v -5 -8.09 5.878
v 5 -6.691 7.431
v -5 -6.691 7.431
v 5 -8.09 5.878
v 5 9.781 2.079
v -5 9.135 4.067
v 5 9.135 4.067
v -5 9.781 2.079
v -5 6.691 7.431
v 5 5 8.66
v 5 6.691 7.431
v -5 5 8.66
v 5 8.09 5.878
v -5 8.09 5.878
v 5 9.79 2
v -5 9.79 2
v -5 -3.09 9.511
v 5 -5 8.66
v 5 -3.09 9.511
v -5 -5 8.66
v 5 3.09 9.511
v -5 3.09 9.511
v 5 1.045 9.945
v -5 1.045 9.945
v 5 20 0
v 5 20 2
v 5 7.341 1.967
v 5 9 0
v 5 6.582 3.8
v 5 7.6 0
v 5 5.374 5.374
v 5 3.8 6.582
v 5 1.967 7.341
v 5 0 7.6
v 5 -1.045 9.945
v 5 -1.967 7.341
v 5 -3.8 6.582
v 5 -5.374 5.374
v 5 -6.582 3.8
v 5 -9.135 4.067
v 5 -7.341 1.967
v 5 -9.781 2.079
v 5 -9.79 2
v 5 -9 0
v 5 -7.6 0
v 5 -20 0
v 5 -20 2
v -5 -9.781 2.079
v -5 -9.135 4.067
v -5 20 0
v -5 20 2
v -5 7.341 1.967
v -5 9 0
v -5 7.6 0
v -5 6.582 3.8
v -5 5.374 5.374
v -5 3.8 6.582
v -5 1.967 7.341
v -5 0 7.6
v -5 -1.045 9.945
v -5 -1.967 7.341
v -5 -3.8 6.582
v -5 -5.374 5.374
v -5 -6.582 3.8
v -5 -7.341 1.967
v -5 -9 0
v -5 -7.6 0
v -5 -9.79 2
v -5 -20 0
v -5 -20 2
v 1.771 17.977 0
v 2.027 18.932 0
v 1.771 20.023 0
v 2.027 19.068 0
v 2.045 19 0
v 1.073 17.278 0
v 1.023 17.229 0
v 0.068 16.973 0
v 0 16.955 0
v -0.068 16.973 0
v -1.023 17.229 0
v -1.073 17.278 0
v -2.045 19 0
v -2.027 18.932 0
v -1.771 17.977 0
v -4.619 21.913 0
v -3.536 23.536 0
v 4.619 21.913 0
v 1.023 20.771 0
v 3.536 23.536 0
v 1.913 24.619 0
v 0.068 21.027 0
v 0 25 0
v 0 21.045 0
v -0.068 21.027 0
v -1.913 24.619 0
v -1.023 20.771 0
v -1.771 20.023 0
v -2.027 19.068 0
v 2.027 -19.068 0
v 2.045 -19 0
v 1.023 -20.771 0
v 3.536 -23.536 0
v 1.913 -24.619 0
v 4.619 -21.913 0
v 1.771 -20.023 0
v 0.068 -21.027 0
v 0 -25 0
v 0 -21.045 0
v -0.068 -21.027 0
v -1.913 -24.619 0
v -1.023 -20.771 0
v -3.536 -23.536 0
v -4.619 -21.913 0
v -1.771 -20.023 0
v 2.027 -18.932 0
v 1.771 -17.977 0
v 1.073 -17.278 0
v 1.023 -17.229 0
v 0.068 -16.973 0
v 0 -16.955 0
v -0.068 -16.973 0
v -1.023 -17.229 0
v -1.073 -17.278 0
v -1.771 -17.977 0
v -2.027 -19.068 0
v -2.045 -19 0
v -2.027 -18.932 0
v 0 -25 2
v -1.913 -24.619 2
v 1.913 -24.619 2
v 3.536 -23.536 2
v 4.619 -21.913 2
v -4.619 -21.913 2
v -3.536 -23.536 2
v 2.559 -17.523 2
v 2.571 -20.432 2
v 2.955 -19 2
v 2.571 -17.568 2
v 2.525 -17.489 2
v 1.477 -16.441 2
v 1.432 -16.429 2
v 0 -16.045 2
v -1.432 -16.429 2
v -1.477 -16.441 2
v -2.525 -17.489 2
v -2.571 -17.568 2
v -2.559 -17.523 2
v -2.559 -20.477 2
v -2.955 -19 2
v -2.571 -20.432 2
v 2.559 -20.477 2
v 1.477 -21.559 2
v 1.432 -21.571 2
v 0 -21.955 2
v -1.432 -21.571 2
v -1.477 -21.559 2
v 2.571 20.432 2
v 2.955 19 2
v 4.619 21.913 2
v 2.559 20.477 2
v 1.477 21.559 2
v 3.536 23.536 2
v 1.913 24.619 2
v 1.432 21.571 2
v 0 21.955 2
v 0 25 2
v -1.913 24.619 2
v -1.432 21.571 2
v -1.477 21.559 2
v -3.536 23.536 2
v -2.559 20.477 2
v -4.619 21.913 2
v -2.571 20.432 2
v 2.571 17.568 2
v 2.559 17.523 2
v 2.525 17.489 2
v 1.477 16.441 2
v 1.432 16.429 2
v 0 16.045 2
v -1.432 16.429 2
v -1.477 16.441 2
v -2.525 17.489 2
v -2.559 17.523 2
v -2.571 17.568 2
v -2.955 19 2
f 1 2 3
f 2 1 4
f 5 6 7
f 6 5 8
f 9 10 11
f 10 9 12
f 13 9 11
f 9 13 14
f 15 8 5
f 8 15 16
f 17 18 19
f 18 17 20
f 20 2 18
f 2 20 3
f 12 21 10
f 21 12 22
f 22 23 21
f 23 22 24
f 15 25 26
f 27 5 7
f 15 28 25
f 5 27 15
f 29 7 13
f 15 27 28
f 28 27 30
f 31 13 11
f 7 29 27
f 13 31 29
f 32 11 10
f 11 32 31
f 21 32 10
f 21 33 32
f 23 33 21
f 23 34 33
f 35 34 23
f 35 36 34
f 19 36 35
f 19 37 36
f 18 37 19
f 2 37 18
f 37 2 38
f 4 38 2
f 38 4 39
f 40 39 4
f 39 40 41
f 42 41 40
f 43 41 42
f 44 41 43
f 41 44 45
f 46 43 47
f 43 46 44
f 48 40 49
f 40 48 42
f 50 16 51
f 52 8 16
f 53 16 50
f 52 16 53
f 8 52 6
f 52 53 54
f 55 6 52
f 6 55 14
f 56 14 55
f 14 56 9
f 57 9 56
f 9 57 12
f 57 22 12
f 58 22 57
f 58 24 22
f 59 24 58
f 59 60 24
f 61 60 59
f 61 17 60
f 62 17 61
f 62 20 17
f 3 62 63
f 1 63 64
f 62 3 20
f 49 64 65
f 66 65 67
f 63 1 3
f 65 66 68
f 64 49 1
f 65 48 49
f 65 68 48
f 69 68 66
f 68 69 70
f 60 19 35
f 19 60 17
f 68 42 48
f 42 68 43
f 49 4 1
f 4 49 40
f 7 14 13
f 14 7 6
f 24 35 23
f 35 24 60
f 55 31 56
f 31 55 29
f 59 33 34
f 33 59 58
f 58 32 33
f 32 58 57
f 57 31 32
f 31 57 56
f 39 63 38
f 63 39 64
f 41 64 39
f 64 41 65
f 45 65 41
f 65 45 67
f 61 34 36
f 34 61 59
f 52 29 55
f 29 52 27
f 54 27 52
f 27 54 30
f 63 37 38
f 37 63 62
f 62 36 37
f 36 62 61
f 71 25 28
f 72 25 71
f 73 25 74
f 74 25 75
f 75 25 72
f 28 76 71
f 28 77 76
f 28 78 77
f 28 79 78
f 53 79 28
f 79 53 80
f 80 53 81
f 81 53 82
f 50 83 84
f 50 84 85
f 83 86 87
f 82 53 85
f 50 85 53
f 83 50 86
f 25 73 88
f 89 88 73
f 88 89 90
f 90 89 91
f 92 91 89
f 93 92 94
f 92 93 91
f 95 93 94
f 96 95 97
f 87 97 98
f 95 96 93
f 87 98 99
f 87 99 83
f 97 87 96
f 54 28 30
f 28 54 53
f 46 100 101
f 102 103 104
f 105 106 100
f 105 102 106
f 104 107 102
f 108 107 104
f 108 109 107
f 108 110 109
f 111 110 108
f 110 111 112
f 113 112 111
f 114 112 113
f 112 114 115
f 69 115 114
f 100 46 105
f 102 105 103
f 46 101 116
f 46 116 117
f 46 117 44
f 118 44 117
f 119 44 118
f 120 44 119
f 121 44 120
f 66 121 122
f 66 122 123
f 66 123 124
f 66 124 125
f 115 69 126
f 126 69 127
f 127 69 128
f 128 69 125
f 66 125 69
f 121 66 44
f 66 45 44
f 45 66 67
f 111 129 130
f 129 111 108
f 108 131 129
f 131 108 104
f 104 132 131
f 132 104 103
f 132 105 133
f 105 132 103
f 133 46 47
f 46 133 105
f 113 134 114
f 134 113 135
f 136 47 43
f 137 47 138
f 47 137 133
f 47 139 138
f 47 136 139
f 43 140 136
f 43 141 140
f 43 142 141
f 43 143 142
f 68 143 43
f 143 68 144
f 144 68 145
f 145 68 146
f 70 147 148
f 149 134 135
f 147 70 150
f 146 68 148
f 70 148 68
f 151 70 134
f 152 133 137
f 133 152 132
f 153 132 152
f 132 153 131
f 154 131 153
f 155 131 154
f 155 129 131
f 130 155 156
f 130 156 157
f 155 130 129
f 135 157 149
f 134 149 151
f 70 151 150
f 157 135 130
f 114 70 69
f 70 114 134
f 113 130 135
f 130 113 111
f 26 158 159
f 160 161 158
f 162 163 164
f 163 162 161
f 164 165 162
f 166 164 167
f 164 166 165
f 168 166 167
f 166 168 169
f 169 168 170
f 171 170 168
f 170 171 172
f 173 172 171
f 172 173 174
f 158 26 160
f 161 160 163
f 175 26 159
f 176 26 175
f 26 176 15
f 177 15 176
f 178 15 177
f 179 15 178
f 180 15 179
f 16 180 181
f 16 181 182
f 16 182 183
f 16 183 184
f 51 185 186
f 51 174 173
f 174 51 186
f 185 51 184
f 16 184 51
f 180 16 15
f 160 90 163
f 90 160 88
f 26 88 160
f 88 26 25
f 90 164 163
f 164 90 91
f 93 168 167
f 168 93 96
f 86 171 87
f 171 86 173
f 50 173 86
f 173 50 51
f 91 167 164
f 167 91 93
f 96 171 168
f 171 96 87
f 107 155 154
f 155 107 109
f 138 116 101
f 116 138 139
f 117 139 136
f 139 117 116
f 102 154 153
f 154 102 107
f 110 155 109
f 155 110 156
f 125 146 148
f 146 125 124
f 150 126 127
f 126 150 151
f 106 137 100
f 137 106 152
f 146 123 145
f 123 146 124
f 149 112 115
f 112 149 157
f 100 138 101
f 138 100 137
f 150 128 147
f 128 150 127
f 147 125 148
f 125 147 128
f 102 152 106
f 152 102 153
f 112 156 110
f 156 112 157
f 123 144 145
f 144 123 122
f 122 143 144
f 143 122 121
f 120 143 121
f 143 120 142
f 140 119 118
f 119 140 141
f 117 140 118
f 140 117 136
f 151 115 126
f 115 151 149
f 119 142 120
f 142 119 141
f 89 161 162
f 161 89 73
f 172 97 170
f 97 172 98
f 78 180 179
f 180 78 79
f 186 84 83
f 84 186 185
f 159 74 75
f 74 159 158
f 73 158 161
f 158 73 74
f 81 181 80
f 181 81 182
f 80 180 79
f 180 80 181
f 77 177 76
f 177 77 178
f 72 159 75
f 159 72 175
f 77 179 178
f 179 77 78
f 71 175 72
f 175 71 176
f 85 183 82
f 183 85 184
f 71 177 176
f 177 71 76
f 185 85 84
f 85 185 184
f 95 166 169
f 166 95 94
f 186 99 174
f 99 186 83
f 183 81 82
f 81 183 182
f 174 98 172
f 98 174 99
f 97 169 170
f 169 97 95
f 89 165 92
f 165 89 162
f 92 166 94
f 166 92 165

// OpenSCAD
/* Cable Strap  - Loic Septemeber 2017 */

// ToDo: More work

height = 2;
depth = 10;

loop_length = 20;
bracket_length = 10;

with_screw_holes = true;

screw_hole_top_depth = 6;
screw_hole_bottom_depth = 4;

//////////
radius = depth / 2;




difference()
{
cable_strap_base();

if(with_screw_holes)
    {
    translate([0,-bracket_length-loop_length/2 +1,-0.1])
      color("red")
      cylinder(height+0.2,screw_hole_bottom_depth/2,screw_hole_top_depth/2,$fn=12);
    
    translate([0,bracket_length + loop_length/2 - 1,-0.1])
      color("red")
      cylinder(height+0.2,screw_hole_bottom_depth/2,screw_hole_top_depth/2,$fn=12);
    }
}



// Helper Modules
module cable_strap_base()
{
    bob = bracket_length + loop_length/2;
    translate([0,-bob,0])
    {
        cylinder(height,radius,radius);
        translate([-depth/2,0,0])
            cube([depth,bracket_length+1,height]);
        
        translate([0,bracket_length+(loop_length/2)])
        {
        rotate([-90,0,90])
            half_ring(loop_length/2,loop_length/2-height*1.2,depth);   
        }
        
        translate([-depth/2,bracket_length+loop_length-1,0])
            cube([depth,bracket_length+1,height]);
        
        translate([0,2*bracket_length+loop_length,0])
            cylinder(height,radius,radius);
    }
}

module half_ring(outer_r,inner_r,depth)
{
    difference()
    {
    ring(outer_r,inner_r,depth);
    
    translate([0,outer_r/2,0])
        cube([2+outer_r*2,outer_r,depth*2],true);
    }
}

module ring(outer_r,inner_r,depth)
{
    translate([0,0,-depth/2])
    {
        difference()
        {
            cylinder(depth,outer_r,outer_r);
            translate([0,0,-2])
                cylinder(depth+4,inner_r,inner_r);
        }
    }
}
